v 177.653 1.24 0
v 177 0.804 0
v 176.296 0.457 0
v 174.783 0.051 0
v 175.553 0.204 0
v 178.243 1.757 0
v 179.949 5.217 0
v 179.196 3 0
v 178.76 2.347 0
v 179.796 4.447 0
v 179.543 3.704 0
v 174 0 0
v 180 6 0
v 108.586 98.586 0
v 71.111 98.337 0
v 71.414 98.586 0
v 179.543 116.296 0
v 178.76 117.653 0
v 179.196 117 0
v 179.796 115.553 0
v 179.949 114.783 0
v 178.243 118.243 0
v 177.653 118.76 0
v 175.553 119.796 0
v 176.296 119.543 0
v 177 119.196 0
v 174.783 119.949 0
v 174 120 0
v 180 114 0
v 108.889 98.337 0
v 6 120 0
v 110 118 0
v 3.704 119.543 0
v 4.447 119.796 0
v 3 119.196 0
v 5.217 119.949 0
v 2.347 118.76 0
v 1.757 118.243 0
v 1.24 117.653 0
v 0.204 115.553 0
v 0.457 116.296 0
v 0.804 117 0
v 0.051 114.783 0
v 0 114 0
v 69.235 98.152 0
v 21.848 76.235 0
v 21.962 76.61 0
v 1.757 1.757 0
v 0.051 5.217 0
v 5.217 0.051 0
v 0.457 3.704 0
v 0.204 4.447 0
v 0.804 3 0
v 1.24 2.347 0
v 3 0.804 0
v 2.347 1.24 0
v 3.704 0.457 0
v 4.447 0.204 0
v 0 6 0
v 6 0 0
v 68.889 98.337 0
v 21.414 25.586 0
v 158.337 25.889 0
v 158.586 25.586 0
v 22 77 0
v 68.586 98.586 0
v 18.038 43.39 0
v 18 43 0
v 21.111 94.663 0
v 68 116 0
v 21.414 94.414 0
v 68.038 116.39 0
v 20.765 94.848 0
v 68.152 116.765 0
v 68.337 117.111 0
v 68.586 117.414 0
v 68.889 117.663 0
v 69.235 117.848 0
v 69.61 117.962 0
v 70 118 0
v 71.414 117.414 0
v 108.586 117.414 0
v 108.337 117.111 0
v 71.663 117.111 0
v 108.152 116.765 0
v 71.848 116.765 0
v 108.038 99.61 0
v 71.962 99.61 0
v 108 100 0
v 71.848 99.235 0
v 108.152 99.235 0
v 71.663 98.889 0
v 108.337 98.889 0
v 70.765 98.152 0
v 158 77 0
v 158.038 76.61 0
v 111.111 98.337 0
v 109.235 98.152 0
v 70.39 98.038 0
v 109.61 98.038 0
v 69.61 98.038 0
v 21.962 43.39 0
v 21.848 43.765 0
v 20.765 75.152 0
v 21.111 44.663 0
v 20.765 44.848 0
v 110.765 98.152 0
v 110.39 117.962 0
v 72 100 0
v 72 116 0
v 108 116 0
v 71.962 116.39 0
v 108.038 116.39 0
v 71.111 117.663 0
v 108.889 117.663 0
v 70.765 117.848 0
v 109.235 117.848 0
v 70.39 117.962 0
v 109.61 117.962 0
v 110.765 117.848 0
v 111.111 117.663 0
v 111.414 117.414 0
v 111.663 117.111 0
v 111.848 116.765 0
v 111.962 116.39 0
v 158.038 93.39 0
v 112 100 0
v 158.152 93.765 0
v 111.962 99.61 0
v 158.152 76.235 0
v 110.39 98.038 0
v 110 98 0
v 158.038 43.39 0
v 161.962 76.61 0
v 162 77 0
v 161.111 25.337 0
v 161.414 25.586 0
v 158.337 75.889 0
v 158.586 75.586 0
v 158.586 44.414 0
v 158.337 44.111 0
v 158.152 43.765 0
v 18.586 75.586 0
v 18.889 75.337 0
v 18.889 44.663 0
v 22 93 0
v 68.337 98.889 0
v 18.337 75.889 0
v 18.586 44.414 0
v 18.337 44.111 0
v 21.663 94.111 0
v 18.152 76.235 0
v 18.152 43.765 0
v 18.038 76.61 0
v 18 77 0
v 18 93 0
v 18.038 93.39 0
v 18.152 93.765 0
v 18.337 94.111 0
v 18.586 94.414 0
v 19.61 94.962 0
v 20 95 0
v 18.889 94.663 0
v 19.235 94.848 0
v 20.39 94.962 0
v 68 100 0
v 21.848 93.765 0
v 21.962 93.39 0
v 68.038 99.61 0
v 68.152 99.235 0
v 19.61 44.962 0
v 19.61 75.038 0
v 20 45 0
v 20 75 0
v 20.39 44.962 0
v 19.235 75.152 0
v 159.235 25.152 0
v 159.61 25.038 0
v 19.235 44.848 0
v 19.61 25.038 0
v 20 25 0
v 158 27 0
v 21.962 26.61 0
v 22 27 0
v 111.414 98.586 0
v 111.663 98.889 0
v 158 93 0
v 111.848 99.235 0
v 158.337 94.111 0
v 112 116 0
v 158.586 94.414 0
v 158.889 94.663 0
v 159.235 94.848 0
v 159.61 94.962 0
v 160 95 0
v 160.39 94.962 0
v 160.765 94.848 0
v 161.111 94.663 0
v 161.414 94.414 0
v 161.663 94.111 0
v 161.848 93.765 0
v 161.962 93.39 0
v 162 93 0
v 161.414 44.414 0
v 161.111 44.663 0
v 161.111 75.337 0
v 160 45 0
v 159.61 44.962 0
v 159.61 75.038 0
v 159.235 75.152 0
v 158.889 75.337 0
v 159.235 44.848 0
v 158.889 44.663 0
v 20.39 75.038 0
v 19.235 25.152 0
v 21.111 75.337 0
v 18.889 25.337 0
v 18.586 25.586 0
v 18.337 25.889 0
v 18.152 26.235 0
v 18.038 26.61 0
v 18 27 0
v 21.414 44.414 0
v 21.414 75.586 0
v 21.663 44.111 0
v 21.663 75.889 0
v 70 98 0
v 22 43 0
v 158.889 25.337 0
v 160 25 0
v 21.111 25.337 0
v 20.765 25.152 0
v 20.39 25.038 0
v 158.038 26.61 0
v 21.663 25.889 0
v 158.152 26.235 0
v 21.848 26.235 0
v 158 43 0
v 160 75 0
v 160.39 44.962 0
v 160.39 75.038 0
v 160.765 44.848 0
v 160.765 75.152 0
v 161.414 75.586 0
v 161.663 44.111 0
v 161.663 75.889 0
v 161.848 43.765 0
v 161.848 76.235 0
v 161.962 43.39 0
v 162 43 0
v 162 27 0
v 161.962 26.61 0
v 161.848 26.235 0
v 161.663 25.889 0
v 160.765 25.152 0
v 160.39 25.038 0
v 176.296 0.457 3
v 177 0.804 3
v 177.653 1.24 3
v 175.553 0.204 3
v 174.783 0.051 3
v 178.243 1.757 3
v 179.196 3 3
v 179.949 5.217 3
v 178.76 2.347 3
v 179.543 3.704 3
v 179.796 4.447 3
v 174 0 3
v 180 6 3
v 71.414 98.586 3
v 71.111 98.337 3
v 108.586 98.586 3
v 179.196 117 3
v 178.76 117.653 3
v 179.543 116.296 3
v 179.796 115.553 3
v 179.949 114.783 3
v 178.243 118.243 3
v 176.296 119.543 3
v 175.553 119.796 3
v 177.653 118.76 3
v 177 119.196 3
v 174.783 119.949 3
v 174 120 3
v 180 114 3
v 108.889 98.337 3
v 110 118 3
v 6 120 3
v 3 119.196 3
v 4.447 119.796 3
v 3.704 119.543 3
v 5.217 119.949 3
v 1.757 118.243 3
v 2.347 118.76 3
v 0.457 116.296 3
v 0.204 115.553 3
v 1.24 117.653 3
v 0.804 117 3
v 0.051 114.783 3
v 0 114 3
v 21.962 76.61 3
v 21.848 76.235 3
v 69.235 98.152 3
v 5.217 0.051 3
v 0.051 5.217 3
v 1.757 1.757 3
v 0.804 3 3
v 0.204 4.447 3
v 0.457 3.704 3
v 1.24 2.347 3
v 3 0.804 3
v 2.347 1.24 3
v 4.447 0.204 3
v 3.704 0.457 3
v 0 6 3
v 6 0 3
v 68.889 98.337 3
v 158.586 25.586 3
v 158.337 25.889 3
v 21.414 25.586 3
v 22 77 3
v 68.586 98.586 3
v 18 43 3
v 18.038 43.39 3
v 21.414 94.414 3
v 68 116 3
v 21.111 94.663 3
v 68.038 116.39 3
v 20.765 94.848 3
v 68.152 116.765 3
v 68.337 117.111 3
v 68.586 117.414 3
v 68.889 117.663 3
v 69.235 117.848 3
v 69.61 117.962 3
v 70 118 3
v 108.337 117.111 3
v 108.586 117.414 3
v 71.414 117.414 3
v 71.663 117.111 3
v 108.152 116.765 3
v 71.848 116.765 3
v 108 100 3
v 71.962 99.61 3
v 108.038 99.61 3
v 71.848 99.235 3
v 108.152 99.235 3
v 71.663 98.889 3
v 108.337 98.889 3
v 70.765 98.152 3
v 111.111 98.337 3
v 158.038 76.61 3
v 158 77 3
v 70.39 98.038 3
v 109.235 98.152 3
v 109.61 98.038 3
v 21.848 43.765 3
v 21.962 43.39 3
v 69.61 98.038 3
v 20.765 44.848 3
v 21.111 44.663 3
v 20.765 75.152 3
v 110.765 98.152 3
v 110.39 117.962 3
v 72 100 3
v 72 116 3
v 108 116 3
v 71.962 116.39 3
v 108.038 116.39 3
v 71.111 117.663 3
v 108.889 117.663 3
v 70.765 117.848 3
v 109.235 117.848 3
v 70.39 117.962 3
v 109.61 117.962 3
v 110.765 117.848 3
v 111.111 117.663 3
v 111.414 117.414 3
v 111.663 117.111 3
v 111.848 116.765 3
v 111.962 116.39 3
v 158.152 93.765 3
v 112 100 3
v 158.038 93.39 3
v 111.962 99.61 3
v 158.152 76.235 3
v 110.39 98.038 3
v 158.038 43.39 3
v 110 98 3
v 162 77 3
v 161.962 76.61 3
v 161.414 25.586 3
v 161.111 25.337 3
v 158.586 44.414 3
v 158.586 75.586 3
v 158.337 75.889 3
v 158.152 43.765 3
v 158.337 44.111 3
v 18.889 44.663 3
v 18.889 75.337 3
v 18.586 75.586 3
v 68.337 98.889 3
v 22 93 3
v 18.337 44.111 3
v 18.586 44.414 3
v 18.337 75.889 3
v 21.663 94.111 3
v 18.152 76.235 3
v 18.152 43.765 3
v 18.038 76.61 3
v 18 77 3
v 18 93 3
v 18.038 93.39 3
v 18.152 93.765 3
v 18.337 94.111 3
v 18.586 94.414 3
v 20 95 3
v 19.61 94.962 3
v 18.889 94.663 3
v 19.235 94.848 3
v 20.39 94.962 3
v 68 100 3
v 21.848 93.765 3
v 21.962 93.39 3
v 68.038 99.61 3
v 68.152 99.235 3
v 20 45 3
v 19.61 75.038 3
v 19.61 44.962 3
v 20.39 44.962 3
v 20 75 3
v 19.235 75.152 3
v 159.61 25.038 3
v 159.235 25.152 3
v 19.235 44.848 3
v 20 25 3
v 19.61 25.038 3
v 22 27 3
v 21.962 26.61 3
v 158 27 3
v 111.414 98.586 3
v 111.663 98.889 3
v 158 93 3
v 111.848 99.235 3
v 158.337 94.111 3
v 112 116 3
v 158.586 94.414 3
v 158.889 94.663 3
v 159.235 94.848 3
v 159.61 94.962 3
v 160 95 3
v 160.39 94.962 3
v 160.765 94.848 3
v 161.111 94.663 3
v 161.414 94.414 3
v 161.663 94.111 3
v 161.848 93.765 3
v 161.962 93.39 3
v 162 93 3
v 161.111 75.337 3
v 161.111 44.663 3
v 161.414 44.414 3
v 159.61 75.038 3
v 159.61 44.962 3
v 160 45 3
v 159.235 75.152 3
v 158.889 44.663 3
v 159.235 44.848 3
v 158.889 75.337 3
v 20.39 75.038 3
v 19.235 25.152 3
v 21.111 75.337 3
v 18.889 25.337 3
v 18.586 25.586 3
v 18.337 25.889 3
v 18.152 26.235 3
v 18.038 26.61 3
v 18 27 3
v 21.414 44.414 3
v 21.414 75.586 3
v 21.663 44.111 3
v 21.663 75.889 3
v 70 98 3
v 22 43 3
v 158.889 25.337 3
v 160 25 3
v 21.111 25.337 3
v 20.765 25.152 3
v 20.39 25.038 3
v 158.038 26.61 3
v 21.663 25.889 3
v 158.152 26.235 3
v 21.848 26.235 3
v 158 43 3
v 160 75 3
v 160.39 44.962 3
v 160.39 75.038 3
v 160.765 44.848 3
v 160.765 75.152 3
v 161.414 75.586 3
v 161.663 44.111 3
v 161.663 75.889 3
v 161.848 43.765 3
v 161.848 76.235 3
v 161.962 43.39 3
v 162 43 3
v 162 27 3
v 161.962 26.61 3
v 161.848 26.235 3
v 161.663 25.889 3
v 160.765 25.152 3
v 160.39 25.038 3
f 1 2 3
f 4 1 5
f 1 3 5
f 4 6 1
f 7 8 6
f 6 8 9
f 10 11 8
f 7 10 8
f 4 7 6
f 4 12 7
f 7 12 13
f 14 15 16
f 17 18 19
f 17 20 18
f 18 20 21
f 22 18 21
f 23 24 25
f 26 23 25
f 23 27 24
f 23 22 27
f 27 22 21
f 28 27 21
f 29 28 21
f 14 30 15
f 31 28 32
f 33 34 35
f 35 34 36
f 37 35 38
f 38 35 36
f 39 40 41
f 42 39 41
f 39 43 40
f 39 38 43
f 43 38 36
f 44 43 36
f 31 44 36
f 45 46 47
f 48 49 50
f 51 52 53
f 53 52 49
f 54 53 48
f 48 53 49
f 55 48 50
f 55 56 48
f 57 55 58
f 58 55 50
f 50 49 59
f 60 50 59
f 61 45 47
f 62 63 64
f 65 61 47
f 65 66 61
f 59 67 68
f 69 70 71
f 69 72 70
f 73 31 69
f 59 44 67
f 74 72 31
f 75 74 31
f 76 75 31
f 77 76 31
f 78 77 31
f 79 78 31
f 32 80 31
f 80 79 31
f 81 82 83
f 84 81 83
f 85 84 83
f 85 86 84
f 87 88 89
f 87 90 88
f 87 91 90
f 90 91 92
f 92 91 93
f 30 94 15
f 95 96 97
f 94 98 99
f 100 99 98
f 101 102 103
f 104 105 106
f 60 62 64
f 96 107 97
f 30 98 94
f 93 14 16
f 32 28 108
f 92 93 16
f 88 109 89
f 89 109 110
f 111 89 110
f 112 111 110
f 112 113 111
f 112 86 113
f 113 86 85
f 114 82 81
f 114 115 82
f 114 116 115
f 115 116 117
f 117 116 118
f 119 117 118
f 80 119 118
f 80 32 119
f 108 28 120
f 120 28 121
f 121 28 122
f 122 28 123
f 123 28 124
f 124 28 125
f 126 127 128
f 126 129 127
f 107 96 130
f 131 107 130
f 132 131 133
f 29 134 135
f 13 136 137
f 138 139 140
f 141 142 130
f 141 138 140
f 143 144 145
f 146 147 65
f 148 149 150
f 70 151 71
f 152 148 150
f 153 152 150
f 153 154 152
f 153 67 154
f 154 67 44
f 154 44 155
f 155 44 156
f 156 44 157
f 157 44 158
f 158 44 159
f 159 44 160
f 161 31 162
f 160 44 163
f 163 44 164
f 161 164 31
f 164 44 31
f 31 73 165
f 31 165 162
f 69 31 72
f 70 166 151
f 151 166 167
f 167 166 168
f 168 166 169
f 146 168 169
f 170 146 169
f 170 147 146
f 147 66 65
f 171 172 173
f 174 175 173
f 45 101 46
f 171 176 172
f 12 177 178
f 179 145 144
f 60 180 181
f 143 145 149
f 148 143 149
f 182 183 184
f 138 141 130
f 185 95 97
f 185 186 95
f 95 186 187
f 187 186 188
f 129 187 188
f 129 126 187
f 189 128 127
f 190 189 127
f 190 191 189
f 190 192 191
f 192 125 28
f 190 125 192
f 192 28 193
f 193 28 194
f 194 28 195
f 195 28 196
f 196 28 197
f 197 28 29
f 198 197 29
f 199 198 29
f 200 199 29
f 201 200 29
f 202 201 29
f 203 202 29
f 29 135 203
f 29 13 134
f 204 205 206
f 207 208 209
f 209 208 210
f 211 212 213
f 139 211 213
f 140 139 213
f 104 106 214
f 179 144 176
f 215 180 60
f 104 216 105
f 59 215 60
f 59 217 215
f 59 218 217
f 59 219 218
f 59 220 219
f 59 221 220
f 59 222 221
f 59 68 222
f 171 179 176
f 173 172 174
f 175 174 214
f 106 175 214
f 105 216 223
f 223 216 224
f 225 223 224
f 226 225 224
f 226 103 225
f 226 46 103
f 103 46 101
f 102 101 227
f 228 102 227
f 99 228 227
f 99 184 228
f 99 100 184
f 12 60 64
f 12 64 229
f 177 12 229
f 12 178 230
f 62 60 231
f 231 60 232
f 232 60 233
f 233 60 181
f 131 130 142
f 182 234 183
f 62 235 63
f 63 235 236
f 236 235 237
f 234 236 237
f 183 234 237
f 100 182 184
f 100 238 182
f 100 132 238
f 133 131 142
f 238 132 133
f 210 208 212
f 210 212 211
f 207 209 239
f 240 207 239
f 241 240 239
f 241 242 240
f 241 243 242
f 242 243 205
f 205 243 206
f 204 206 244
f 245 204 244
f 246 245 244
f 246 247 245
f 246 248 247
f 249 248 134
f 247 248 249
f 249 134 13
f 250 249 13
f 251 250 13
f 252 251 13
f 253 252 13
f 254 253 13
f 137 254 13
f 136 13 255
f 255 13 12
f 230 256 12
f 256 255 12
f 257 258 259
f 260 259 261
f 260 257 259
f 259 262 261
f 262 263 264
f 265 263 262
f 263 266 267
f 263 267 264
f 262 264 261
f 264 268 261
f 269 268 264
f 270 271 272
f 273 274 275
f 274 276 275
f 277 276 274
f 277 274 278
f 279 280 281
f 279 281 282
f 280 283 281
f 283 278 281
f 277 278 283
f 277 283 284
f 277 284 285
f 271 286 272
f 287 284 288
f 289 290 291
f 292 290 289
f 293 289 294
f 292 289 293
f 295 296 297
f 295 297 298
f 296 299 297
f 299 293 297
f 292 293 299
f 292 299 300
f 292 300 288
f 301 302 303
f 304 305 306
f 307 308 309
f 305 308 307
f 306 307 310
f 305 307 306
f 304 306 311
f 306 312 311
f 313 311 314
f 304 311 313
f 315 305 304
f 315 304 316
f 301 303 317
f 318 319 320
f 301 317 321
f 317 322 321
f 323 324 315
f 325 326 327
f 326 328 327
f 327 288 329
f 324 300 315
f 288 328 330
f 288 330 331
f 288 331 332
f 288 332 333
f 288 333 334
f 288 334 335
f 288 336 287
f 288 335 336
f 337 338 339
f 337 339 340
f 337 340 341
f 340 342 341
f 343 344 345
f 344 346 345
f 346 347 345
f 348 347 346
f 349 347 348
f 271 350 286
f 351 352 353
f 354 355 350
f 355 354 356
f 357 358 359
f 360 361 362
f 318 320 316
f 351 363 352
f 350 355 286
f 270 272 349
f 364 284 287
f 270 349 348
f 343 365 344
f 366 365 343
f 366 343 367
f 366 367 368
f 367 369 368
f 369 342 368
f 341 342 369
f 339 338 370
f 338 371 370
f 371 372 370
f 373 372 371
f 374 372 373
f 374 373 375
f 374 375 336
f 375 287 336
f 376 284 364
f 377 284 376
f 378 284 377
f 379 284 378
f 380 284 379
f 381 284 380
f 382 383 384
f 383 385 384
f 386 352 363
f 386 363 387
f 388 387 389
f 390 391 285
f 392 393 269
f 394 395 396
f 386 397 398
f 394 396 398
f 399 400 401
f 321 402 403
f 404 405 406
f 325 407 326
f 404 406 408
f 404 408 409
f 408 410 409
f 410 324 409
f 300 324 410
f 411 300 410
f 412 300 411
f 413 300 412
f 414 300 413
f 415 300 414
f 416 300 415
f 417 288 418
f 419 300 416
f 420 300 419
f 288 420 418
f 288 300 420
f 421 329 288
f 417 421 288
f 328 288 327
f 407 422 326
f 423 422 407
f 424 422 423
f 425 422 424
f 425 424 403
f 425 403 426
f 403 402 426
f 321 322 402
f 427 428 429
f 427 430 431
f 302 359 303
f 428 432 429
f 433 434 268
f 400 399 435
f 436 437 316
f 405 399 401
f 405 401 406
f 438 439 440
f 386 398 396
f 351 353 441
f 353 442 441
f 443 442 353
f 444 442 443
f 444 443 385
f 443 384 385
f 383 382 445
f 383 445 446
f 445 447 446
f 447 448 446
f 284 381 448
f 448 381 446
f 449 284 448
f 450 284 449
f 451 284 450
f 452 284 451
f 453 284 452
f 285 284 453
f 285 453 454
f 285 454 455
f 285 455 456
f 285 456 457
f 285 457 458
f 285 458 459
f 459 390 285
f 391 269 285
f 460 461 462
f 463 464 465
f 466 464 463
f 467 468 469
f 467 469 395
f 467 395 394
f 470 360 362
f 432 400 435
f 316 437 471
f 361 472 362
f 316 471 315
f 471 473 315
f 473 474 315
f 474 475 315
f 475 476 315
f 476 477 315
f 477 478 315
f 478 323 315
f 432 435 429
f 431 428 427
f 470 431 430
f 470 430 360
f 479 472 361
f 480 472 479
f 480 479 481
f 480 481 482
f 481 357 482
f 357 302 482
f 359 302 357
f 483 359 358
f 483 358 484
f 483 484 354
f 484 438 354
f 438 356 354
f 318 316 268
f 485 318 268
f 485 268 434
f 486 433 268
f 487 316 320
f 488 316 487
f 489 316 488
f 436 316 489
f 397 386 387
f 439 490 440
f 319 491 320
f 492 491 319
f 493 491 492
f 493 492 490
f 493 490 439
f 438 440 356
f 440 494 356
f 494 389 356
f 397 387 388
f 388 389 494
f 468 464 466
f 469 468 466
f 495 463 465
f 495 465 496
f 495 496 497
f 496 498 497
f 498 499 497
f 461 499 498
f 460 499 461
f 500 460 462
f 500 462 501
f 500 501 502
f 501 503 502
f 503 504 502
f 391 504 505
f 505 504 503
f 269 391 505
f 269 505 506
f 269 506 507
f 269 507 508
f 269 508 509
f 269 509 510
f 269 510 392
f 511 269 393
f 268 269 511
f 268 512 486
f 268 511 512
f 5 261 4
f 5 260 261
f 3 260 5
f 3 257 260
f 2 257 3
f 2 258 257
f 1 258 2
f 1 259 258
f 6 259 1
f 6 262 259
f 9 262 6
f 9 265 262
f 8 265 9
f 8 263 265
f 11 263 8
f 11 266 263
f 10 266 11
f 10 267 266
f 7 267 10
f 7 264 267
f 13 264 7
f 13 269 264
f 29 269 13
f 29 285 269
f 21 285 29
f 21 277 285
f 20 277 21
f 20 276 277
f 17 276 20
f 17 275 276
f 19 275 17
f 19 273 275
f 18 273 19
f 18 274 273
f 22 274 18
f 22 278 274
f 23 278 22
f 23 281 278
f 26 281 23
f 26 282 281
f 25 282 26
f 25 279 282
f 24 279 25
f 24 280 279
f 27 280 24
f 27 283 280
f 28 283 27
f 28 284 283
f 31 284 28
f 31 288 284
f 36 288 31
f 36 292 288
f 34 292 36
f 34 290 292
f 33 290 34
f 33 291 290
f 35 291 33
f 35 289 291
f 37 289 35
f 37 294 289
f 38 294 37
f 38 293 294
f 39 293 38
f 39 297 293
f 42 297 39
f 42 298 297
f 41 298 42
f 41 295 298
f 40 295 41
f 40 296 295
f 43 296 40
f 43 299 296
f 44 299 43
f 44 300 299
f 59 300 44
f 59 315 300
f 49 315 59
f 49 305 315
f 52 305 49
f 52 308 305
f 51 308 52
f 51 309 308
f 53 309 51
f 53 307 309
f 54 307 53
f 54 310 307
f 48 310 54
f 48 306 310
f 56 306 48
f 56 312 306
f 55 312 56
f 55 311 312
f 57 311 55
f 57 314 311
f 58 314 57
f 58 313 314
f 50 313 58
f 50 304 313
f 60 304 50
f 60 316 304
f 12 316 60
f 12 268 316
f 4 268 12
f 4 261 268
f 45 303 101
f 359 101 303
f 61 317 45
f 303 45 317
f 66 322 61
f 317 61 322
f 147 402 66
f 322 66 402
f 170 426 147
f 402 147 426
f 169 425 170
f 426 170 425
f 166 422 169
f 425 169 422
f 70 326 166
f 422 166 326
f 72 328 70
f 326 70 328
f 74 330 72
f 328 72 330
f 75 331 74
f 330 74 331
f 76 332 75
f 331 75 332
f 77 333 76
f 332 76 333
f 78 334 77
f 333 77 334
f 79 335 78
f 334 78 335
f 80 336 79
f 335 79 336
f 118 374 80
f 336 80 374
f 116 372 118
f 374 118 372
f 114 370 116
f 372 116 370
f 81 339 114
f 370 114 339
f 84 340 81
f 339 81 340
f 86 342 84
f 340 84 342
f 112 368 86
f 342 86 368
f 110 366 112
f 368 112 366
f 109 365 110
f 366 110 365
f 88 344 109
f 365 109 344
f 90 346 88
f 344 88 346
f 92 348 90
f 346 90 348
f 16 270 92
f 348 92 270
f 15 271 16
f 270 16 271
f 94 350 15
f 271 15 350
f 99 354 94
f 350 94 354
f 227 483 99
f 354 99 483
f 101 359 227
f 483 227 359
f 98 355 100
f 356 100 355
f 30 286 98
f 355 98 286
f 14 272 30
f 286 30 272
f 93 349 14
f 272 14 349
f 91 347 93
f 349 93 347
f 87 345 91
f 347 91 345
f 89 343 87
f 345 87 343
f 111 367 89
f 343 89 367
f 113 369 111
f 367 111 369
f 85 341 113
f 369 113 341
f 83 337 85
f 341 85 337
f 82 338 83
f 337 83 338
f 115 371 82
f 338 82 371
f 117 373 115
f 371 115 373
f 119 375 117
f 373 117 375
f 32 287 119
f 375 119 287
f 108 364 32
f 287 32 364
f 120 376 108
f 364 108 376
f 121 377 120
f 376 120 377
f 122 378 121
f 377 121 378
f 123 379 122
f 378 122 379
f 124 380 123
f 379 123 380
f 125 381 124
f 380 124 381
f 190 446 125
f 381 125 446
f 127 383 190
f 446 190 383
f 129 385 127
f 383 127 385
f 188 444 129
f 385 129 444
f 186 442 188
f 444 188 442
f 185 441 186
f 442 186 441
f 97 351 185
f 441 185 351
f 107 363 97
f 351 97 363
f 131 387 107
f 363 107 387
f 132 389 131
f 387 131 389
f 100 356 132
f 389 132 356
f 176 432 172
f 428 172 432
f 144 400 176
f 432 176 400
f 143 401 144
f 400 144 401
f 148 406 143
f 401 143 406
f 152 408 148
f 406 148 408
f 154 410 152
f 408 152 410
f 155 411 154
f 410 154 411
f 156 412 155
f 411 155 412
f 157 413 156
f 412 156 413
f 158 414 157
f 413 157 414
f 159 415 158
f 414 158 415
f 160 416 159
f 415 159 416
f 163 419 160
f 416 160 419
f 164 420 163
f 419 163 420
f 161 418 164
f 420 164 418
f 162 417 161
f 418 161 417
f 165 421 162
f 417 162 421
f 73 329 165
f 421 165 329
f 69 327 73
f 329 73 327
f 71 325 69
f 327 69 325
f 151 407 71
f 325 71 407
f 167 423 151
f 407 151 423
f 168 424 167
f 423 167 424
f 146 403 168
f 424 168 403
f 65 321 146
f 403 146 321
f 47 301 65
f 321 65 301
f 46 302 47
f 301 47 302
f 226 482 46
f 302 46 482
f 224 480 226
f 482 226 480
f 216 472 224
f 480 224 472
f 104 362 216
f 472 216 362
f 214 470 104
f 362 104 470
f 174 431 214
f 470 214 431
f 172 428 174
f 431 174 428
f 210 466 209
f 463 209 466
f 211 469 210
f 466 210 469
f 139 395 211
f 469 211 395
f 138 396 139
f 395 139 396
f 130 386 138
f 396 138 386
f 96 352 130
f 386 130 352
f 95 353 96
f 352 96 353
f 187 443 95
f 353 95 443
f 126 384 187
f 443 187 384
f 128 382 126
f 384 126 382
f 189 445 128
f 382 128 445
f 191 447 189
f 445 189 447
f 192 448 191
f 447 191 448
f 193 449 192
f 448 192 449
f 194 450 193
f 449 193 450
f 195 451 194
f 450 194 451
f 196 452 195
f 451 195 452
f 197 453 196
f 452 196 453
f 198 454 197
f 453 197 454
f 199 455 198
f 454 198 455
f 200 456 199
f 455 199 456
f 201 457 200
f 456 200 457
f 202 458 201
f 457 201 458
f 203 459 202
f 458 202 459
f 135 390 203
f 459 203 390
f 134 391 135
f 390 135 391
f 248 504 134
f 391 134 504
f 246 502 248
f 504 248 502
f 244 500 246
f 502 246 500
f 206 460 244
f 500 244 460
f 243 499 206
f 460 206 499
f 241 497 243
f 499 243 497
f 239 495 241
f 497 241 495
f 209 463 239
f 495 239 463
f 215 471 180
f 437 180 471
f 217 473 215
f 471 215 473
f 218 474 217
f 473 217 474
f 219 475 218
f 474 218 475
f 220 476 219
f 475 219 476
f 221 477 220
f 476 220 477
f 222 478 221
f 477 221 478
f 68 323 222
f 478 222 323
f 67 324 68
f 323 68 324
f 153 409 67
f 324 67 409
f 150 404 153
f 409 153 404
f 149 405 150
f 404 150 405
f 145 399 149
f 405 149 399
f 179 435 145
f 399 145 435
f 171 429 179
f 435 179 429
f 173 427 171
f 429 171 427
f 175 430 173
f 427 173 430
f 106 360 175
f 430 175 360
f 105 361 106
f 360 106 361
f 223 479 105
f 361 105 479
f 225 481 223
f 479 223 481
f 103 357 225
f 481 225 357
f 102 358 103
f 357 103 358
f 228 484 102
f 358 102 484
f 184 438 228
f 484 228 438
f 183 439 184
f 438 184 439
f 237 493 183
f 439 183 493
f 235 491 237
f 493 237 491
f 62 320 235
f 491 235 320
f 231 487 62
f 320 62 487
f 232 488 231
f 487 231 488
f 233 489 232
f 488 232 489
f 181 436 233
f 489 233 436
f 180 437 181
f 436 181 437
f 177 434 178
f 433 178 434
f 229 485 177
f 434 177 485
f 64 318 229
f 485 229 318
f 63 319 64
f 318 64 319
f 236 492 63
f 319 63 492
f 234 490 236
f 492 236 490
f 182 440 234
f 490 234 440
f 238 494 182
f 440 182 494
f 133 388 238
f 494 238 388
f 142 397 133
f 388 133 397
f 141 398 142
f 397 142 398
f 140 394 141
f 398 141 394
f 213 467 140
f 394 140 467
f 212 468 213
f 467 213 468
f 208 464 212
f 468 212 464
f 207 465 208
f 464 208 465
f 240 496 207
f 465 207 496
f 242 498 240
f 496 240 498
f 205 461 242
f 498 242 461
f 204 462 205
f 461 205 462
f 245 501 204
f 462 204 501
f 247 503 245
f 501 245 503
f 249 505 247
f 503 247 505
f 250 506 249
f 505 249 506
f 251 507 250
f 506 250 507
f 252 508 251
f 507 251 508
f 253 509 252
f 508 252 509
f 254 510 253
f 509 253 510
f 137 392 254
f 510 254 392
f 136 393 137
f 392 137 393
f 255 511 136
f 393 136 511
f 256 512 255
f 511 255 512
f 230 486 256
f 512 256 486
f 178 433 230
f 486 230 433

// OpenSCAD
// Planned universal breadboard/board-emulation plate. Units: mm.
// NOT_FABRICATED; no Pico PCB hole dimensions or fitted hardware are asserted.
// Project-authored MIT design. Render/export requires a separately installed
// OpenSCAD; no CAD render or manufacturing action is claimed by this source.
plate_length_mm = 180;
plate_width_mm = 120;
plate_thickness_mm = 3;
corner_radius_mm = 6;
slot_length_mm = 20;
slot_width_mm = 4;

module rounded_rectangle(length_mm, width_mm, radius_mm) {
    hull() for (x=[radius_mm,length_mm-radius_mm])
        for(y=[radius_mm,width_mm-radius_mm])
            translate([x,y]) circle(r=radius_mm,$fn=48);
}
module strap_slot(x_mm,y_mm) {
    // Drawing coordinates start at the top-left; CAD XY starts bottom-left.
    translate([x_mm,plate_width_mm-y_mm]) hull()
        for(y=[-(slot_length_mm-slot_width_mm)/2,(slot_length_mm-slot_width_mm)/2])
            translate([0,y]) circle(r=slot_width_mm/2,$fn=32);
}
linear_extrude(height=plate_thickness_mm)
    difference() {
        rounded_rectangle(plate_length_mm,plate_width_mm,corner_radius_mm);
        for(x=[20,160]) for(y=[35,85]) strap_slot(x,y);
        // Optional cable strain-relief tie; no force is transferred to USB shell.
        for(x=[70,110]) strap_slot(x,12);
    }
